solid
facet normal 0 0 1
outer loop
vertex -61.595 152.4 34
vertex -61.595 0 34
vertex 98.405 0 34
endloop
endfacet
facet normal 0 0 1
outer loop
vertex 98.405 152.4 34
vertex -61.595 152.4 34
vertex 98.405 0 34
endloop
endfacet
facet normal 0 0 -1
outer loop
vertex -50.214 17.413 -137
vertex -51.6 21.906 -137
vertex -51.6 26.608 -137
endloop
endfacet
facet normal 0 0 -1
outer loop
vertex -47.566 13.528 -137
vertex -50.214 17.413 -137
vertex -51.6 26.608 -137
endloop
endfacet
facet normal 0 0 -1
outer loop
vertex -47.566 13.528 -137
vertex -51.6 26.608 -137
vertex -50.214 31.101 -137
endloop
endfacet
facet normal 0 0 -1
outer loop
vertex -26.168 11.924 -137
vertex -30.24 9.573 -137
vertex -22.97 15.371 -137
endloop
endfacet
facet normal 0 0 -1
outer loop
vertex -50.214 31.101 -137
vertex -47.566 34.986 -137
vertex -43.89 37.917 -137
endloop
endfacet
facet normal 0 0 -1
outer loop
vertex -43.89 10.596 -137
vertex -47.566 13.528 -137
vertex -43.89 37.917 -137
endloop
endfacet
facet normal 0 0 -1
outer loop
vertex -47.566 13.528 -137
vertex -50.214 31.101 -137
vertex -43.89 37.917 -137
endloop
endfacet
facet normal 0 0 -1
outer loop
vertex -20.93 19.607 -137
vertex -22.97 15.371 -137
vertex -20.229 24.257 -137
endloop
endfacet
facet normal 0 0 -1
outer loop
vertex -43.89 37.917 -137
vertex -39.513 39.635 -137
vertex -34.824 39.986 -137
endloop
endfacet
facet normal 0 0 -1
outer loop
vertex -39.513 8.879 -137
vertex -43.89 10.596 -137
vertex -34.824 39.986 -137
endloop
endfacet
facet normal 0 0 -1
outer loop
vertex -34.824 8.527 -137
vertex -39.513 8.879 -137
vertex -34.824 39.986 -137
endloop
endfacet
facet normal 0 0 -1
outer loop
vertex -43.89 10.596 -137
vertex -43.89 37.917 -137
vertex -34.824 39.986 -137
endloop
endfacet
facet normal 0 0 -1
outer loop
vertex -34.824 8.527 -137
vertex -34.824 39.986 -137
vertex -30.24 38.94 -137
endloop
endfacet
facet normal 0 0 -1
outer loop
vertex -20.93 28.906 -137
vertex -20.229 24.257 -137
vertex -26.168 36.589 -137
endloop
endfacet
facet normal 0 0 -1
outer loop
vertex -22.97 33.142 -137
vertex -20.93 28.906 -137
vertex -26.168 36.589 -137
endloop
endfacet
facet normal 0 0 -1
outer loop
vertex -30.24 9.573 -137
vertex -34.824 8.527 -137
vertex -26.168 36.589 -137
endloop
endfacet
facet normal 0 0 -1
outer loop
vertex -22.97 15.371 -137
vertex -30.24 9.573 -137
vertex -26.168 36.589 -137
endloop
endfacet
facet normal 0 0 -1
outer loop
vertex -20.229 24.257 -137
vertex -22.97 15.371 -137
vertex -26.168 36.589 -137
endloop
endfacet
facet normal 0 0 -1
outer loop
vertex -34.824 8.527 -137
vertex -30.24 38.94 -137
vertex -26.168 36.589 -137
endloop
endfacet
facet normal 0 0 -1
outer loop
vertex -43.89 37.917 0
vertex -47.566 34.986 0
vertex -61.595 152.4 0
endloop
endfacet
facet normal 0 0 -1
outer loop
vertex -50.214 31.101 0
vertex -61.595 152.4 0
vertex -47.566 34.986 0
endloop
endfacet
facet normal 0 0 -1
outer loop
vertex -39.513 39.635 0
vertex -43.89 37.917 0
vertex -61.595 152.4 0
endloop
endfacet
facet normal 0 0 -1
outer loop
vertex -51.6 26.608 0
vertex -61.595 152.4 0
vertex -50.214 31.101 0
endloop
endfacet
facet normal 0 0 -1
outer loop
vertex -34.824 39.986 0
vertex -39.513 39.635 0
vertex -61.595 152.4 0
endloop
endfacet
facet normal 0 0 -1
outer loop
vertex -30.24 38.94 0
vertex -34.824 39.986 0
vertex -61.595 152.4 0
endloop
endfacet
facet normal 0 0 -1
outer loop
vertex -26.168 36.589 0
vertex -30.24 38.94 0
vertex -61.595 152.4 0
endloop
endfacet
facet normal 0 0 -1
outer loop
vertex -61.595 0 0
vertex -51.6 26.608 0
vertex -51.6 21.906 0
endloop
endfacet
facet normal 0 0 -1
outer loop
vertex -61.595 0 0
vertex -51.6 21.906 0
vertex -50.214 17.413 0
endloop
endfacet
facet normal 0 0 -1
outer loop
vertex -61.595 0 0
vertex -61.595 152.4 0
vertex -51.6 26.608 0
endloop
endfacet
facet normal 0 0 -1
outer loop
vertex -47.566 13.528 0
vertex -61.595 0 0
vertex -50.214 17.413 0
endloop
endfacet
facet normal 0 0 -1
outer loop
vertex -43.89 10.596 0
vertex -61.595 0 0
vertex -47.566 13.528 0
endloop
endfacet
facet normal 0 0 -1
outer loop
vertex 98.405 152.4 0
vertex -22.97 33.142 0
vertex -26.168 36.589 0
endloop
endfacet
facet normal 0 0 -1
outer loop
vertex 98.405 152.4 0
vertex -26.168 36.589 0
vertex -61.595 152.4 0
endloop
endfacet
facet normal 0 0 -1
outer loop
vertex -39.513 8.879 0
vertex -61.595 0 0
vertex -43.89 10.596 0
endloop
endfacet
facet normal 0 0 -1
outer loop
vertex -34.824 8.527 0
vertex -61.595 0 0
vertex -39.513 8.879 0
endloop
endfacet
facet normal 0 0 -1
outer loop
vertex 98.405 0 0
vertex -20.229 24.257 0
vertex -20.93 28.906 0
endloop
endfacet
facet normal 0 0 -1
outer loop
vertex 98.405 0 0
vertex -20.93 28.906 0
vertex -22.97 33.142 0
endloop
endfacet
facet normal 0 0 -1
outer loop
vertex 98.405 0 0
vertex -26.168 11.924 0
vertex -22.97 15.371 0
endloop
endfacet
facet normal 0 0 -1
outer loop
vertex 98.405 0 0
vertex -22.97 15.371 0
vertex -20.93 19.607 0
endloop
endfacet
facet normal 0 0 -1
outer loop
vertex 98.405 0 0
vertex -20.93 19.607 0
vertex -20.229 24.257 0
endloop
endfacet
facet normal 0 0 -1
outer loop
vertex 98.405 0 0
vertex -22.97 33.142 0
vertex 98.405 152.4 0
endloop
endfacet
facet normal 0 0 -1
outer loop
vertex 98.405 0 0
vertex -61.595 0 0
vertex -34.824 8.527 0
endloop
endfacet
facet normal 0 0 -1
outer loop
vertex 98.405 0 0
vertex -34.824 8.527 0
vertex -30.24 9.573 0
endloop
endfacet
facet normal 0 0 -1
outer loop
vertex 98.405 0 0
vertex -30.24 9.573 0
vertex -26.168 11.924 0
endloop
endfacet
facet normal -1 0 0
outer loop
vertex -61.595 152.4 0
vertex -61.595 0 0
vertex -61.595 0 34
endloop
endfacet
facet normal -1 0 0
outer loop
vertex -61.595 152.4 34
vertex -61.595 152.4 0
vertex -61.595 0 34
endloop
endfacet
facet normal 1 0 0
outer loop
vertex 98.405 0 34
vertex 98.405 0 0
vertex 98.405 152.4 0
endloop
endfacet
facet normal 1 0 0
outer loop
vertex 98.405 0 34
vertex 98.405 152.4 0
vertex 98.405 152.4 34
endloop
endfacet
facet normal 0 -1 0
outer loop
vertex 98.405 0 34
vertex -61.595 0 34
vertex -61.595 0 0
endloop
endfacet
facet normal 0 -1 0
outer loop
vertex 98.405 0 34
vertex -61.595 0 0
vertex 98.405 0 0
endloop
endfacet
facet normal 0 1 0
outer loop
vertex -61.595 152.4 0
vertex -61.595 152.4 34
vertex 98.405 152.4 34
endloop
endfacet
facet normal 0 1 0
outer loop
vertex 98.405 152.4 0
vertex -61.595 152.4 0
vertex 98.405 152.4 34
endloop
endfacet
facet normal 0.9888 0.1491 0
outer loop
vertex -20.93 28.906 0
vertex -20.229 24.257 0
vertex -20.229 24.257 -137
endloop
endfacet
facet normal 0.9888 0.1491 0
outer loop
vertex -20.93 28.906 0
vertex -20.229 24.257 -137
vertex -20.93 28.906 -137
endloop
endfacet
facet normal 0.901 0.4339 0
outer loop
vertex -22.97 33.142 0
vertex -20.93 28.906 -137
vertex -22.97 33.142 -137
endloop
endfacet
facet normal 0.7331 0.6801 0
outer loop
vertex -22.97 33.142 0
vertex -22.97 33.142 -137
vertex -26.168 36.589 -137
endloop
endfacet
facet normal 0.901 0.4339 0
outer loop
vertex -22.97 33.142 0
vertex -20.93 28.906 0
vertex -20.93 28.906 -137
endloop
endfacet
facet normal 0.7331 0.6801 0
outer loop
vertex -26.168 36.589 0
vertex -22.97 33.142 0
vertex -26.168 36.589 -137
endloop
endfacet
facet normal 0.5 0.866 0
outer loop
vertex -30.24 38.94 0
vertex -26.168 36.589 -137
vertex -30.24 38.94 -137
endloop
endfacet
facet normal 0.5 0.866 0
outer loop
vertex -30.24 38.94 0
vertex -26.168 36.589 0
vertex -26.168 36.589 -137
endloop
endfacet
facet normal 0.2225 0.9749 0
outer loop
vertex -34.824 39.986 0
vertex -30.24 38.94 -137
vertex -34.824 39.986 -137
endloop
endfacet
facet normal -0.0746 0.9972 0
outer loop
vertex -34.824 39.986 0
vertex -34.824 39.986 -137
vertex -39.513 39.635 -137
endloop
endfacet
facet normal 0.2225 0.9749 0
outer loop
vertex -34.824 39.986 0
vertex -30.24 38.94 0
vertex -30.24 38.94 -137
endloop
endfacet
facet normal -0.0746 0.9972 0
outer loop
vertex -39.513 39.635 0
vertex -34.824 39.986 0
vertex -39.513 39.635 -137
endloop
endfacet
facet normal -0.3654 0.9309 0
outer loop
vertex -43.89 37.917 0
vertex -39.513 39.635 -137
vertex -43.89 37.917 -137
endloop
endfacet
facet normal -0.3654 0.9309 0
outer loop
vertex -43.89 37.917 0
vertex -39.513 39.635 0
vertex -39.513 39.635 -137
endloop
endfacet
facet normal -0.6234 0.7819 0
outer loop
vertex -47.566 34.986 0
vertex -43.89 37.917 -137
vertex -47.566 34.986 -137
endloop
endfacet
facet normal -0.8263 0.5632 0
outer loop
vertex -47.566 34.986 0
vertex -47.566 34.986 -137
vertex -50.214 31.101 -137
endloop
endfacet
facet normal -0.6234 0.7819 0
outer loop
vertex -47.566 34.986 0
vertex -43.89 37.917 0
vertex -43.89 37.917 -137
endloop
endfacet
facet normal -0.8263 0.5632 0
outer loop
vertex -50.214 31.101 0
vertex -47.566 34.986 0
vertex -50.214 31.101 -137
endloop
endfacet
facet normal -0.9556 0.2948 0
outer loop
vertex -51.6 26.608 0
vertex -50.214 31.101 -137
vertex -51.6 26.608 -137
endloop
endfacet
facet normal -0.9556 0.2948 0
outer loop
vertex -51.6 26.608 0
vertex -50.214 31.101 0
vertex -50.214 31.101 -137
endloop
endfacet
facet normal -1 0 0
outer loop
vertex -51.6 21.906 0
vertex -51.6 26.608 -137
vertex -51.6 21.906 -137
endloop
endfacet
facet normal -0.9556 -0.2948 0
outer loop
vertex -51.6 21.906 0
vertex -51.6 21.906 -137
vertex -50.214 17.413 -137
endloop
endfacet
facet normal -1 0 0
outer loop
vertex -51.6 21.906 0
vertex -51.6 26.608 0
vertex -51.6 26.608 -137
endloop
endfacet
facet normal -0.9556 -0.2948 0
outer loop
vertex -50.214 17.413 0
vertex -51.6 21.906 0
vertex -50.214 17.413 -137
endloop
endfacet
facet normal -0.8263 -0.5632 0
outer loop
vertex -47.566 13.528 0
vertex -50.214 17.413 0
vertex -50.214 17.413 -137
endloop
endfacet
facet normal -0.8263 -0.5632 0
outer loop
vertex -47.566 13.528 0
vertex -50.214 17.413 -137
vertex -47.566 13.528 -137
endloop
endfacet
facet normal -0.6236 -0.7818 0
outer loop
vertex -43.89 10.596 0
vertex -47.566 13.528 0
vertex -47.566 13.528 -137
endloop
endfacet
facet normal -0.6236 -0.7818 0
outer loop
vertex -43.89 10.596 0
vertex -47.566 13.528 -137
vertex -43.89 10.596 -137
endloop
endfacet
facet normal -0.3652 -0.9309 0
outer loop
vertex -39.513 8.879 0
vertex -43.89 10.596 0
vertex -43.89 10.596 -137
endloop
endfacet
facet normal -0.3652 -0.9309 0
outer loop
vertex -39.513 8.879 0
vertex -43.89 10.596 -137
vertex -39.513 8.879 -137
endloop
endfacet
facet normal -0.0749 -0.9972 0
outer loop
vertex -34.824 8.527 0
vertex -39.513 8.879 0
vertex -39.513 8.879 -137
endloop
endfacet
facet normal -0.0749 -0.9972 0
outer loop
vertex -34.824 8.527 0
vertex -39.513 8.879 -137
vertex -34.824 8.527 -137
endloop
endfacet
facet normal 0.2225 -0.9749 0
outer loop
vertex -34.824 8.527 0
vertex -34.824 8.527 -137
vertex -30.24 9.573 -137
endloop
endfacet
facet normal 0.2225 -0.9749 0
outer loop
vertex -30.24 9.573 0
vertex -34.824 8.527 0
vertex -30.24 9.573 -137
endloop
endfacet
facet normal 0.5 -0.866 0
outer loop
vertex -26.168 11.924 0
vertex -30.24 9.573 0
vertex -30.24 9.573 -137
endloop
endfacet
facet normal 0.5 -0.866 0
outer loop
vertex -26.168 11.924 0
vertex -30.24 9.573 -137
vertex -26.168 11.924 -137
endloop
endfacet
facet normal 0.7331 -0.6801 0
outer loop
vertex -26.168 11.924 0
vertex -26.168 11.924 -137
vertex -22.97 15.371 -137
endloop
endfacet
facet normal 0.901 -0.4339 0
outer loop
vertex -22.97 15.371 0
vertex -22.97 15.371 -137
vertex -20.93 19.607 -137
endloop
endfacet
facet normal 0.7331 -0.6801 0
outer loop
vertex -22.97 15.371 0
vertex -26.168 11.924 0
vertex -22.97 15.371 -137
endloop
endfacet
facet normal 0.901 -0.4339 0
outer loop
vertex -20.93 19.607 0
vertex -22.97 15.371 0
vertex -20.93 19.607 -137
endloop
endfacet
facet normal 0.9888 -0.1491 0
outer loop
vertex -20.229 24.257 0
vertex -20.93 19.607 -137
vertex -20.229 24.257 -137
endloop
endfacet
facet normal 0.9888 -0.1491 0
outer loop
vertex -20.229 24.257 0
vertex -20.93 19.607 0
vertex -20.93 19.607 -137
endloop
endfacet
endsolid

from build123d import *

# Parameters (mm, degrees)
F0_W     = 160
F0_H     = 34
F1_DEPTH = 152.4
F2_R     = 15.773728
F3_DEPTH = 137


with BuildPart() as f1:
    # F0 (on Front) → F1 (new body)
    with BuildSketch(Plane.XZ):
        with Locations((18.404959, 17)):
            Rectangle(F0_W, F0_H)
    extrude(amount=-F1_DEPTH)

    # F2 (on Top) → F3 (join)
    with BuildSketch(Plane.XY):
        with Locations((-36.002856, 24.256775)):
            Circle(F2_R)
    extrude(amount=-F3_DEPTH)


solid = f1.part
